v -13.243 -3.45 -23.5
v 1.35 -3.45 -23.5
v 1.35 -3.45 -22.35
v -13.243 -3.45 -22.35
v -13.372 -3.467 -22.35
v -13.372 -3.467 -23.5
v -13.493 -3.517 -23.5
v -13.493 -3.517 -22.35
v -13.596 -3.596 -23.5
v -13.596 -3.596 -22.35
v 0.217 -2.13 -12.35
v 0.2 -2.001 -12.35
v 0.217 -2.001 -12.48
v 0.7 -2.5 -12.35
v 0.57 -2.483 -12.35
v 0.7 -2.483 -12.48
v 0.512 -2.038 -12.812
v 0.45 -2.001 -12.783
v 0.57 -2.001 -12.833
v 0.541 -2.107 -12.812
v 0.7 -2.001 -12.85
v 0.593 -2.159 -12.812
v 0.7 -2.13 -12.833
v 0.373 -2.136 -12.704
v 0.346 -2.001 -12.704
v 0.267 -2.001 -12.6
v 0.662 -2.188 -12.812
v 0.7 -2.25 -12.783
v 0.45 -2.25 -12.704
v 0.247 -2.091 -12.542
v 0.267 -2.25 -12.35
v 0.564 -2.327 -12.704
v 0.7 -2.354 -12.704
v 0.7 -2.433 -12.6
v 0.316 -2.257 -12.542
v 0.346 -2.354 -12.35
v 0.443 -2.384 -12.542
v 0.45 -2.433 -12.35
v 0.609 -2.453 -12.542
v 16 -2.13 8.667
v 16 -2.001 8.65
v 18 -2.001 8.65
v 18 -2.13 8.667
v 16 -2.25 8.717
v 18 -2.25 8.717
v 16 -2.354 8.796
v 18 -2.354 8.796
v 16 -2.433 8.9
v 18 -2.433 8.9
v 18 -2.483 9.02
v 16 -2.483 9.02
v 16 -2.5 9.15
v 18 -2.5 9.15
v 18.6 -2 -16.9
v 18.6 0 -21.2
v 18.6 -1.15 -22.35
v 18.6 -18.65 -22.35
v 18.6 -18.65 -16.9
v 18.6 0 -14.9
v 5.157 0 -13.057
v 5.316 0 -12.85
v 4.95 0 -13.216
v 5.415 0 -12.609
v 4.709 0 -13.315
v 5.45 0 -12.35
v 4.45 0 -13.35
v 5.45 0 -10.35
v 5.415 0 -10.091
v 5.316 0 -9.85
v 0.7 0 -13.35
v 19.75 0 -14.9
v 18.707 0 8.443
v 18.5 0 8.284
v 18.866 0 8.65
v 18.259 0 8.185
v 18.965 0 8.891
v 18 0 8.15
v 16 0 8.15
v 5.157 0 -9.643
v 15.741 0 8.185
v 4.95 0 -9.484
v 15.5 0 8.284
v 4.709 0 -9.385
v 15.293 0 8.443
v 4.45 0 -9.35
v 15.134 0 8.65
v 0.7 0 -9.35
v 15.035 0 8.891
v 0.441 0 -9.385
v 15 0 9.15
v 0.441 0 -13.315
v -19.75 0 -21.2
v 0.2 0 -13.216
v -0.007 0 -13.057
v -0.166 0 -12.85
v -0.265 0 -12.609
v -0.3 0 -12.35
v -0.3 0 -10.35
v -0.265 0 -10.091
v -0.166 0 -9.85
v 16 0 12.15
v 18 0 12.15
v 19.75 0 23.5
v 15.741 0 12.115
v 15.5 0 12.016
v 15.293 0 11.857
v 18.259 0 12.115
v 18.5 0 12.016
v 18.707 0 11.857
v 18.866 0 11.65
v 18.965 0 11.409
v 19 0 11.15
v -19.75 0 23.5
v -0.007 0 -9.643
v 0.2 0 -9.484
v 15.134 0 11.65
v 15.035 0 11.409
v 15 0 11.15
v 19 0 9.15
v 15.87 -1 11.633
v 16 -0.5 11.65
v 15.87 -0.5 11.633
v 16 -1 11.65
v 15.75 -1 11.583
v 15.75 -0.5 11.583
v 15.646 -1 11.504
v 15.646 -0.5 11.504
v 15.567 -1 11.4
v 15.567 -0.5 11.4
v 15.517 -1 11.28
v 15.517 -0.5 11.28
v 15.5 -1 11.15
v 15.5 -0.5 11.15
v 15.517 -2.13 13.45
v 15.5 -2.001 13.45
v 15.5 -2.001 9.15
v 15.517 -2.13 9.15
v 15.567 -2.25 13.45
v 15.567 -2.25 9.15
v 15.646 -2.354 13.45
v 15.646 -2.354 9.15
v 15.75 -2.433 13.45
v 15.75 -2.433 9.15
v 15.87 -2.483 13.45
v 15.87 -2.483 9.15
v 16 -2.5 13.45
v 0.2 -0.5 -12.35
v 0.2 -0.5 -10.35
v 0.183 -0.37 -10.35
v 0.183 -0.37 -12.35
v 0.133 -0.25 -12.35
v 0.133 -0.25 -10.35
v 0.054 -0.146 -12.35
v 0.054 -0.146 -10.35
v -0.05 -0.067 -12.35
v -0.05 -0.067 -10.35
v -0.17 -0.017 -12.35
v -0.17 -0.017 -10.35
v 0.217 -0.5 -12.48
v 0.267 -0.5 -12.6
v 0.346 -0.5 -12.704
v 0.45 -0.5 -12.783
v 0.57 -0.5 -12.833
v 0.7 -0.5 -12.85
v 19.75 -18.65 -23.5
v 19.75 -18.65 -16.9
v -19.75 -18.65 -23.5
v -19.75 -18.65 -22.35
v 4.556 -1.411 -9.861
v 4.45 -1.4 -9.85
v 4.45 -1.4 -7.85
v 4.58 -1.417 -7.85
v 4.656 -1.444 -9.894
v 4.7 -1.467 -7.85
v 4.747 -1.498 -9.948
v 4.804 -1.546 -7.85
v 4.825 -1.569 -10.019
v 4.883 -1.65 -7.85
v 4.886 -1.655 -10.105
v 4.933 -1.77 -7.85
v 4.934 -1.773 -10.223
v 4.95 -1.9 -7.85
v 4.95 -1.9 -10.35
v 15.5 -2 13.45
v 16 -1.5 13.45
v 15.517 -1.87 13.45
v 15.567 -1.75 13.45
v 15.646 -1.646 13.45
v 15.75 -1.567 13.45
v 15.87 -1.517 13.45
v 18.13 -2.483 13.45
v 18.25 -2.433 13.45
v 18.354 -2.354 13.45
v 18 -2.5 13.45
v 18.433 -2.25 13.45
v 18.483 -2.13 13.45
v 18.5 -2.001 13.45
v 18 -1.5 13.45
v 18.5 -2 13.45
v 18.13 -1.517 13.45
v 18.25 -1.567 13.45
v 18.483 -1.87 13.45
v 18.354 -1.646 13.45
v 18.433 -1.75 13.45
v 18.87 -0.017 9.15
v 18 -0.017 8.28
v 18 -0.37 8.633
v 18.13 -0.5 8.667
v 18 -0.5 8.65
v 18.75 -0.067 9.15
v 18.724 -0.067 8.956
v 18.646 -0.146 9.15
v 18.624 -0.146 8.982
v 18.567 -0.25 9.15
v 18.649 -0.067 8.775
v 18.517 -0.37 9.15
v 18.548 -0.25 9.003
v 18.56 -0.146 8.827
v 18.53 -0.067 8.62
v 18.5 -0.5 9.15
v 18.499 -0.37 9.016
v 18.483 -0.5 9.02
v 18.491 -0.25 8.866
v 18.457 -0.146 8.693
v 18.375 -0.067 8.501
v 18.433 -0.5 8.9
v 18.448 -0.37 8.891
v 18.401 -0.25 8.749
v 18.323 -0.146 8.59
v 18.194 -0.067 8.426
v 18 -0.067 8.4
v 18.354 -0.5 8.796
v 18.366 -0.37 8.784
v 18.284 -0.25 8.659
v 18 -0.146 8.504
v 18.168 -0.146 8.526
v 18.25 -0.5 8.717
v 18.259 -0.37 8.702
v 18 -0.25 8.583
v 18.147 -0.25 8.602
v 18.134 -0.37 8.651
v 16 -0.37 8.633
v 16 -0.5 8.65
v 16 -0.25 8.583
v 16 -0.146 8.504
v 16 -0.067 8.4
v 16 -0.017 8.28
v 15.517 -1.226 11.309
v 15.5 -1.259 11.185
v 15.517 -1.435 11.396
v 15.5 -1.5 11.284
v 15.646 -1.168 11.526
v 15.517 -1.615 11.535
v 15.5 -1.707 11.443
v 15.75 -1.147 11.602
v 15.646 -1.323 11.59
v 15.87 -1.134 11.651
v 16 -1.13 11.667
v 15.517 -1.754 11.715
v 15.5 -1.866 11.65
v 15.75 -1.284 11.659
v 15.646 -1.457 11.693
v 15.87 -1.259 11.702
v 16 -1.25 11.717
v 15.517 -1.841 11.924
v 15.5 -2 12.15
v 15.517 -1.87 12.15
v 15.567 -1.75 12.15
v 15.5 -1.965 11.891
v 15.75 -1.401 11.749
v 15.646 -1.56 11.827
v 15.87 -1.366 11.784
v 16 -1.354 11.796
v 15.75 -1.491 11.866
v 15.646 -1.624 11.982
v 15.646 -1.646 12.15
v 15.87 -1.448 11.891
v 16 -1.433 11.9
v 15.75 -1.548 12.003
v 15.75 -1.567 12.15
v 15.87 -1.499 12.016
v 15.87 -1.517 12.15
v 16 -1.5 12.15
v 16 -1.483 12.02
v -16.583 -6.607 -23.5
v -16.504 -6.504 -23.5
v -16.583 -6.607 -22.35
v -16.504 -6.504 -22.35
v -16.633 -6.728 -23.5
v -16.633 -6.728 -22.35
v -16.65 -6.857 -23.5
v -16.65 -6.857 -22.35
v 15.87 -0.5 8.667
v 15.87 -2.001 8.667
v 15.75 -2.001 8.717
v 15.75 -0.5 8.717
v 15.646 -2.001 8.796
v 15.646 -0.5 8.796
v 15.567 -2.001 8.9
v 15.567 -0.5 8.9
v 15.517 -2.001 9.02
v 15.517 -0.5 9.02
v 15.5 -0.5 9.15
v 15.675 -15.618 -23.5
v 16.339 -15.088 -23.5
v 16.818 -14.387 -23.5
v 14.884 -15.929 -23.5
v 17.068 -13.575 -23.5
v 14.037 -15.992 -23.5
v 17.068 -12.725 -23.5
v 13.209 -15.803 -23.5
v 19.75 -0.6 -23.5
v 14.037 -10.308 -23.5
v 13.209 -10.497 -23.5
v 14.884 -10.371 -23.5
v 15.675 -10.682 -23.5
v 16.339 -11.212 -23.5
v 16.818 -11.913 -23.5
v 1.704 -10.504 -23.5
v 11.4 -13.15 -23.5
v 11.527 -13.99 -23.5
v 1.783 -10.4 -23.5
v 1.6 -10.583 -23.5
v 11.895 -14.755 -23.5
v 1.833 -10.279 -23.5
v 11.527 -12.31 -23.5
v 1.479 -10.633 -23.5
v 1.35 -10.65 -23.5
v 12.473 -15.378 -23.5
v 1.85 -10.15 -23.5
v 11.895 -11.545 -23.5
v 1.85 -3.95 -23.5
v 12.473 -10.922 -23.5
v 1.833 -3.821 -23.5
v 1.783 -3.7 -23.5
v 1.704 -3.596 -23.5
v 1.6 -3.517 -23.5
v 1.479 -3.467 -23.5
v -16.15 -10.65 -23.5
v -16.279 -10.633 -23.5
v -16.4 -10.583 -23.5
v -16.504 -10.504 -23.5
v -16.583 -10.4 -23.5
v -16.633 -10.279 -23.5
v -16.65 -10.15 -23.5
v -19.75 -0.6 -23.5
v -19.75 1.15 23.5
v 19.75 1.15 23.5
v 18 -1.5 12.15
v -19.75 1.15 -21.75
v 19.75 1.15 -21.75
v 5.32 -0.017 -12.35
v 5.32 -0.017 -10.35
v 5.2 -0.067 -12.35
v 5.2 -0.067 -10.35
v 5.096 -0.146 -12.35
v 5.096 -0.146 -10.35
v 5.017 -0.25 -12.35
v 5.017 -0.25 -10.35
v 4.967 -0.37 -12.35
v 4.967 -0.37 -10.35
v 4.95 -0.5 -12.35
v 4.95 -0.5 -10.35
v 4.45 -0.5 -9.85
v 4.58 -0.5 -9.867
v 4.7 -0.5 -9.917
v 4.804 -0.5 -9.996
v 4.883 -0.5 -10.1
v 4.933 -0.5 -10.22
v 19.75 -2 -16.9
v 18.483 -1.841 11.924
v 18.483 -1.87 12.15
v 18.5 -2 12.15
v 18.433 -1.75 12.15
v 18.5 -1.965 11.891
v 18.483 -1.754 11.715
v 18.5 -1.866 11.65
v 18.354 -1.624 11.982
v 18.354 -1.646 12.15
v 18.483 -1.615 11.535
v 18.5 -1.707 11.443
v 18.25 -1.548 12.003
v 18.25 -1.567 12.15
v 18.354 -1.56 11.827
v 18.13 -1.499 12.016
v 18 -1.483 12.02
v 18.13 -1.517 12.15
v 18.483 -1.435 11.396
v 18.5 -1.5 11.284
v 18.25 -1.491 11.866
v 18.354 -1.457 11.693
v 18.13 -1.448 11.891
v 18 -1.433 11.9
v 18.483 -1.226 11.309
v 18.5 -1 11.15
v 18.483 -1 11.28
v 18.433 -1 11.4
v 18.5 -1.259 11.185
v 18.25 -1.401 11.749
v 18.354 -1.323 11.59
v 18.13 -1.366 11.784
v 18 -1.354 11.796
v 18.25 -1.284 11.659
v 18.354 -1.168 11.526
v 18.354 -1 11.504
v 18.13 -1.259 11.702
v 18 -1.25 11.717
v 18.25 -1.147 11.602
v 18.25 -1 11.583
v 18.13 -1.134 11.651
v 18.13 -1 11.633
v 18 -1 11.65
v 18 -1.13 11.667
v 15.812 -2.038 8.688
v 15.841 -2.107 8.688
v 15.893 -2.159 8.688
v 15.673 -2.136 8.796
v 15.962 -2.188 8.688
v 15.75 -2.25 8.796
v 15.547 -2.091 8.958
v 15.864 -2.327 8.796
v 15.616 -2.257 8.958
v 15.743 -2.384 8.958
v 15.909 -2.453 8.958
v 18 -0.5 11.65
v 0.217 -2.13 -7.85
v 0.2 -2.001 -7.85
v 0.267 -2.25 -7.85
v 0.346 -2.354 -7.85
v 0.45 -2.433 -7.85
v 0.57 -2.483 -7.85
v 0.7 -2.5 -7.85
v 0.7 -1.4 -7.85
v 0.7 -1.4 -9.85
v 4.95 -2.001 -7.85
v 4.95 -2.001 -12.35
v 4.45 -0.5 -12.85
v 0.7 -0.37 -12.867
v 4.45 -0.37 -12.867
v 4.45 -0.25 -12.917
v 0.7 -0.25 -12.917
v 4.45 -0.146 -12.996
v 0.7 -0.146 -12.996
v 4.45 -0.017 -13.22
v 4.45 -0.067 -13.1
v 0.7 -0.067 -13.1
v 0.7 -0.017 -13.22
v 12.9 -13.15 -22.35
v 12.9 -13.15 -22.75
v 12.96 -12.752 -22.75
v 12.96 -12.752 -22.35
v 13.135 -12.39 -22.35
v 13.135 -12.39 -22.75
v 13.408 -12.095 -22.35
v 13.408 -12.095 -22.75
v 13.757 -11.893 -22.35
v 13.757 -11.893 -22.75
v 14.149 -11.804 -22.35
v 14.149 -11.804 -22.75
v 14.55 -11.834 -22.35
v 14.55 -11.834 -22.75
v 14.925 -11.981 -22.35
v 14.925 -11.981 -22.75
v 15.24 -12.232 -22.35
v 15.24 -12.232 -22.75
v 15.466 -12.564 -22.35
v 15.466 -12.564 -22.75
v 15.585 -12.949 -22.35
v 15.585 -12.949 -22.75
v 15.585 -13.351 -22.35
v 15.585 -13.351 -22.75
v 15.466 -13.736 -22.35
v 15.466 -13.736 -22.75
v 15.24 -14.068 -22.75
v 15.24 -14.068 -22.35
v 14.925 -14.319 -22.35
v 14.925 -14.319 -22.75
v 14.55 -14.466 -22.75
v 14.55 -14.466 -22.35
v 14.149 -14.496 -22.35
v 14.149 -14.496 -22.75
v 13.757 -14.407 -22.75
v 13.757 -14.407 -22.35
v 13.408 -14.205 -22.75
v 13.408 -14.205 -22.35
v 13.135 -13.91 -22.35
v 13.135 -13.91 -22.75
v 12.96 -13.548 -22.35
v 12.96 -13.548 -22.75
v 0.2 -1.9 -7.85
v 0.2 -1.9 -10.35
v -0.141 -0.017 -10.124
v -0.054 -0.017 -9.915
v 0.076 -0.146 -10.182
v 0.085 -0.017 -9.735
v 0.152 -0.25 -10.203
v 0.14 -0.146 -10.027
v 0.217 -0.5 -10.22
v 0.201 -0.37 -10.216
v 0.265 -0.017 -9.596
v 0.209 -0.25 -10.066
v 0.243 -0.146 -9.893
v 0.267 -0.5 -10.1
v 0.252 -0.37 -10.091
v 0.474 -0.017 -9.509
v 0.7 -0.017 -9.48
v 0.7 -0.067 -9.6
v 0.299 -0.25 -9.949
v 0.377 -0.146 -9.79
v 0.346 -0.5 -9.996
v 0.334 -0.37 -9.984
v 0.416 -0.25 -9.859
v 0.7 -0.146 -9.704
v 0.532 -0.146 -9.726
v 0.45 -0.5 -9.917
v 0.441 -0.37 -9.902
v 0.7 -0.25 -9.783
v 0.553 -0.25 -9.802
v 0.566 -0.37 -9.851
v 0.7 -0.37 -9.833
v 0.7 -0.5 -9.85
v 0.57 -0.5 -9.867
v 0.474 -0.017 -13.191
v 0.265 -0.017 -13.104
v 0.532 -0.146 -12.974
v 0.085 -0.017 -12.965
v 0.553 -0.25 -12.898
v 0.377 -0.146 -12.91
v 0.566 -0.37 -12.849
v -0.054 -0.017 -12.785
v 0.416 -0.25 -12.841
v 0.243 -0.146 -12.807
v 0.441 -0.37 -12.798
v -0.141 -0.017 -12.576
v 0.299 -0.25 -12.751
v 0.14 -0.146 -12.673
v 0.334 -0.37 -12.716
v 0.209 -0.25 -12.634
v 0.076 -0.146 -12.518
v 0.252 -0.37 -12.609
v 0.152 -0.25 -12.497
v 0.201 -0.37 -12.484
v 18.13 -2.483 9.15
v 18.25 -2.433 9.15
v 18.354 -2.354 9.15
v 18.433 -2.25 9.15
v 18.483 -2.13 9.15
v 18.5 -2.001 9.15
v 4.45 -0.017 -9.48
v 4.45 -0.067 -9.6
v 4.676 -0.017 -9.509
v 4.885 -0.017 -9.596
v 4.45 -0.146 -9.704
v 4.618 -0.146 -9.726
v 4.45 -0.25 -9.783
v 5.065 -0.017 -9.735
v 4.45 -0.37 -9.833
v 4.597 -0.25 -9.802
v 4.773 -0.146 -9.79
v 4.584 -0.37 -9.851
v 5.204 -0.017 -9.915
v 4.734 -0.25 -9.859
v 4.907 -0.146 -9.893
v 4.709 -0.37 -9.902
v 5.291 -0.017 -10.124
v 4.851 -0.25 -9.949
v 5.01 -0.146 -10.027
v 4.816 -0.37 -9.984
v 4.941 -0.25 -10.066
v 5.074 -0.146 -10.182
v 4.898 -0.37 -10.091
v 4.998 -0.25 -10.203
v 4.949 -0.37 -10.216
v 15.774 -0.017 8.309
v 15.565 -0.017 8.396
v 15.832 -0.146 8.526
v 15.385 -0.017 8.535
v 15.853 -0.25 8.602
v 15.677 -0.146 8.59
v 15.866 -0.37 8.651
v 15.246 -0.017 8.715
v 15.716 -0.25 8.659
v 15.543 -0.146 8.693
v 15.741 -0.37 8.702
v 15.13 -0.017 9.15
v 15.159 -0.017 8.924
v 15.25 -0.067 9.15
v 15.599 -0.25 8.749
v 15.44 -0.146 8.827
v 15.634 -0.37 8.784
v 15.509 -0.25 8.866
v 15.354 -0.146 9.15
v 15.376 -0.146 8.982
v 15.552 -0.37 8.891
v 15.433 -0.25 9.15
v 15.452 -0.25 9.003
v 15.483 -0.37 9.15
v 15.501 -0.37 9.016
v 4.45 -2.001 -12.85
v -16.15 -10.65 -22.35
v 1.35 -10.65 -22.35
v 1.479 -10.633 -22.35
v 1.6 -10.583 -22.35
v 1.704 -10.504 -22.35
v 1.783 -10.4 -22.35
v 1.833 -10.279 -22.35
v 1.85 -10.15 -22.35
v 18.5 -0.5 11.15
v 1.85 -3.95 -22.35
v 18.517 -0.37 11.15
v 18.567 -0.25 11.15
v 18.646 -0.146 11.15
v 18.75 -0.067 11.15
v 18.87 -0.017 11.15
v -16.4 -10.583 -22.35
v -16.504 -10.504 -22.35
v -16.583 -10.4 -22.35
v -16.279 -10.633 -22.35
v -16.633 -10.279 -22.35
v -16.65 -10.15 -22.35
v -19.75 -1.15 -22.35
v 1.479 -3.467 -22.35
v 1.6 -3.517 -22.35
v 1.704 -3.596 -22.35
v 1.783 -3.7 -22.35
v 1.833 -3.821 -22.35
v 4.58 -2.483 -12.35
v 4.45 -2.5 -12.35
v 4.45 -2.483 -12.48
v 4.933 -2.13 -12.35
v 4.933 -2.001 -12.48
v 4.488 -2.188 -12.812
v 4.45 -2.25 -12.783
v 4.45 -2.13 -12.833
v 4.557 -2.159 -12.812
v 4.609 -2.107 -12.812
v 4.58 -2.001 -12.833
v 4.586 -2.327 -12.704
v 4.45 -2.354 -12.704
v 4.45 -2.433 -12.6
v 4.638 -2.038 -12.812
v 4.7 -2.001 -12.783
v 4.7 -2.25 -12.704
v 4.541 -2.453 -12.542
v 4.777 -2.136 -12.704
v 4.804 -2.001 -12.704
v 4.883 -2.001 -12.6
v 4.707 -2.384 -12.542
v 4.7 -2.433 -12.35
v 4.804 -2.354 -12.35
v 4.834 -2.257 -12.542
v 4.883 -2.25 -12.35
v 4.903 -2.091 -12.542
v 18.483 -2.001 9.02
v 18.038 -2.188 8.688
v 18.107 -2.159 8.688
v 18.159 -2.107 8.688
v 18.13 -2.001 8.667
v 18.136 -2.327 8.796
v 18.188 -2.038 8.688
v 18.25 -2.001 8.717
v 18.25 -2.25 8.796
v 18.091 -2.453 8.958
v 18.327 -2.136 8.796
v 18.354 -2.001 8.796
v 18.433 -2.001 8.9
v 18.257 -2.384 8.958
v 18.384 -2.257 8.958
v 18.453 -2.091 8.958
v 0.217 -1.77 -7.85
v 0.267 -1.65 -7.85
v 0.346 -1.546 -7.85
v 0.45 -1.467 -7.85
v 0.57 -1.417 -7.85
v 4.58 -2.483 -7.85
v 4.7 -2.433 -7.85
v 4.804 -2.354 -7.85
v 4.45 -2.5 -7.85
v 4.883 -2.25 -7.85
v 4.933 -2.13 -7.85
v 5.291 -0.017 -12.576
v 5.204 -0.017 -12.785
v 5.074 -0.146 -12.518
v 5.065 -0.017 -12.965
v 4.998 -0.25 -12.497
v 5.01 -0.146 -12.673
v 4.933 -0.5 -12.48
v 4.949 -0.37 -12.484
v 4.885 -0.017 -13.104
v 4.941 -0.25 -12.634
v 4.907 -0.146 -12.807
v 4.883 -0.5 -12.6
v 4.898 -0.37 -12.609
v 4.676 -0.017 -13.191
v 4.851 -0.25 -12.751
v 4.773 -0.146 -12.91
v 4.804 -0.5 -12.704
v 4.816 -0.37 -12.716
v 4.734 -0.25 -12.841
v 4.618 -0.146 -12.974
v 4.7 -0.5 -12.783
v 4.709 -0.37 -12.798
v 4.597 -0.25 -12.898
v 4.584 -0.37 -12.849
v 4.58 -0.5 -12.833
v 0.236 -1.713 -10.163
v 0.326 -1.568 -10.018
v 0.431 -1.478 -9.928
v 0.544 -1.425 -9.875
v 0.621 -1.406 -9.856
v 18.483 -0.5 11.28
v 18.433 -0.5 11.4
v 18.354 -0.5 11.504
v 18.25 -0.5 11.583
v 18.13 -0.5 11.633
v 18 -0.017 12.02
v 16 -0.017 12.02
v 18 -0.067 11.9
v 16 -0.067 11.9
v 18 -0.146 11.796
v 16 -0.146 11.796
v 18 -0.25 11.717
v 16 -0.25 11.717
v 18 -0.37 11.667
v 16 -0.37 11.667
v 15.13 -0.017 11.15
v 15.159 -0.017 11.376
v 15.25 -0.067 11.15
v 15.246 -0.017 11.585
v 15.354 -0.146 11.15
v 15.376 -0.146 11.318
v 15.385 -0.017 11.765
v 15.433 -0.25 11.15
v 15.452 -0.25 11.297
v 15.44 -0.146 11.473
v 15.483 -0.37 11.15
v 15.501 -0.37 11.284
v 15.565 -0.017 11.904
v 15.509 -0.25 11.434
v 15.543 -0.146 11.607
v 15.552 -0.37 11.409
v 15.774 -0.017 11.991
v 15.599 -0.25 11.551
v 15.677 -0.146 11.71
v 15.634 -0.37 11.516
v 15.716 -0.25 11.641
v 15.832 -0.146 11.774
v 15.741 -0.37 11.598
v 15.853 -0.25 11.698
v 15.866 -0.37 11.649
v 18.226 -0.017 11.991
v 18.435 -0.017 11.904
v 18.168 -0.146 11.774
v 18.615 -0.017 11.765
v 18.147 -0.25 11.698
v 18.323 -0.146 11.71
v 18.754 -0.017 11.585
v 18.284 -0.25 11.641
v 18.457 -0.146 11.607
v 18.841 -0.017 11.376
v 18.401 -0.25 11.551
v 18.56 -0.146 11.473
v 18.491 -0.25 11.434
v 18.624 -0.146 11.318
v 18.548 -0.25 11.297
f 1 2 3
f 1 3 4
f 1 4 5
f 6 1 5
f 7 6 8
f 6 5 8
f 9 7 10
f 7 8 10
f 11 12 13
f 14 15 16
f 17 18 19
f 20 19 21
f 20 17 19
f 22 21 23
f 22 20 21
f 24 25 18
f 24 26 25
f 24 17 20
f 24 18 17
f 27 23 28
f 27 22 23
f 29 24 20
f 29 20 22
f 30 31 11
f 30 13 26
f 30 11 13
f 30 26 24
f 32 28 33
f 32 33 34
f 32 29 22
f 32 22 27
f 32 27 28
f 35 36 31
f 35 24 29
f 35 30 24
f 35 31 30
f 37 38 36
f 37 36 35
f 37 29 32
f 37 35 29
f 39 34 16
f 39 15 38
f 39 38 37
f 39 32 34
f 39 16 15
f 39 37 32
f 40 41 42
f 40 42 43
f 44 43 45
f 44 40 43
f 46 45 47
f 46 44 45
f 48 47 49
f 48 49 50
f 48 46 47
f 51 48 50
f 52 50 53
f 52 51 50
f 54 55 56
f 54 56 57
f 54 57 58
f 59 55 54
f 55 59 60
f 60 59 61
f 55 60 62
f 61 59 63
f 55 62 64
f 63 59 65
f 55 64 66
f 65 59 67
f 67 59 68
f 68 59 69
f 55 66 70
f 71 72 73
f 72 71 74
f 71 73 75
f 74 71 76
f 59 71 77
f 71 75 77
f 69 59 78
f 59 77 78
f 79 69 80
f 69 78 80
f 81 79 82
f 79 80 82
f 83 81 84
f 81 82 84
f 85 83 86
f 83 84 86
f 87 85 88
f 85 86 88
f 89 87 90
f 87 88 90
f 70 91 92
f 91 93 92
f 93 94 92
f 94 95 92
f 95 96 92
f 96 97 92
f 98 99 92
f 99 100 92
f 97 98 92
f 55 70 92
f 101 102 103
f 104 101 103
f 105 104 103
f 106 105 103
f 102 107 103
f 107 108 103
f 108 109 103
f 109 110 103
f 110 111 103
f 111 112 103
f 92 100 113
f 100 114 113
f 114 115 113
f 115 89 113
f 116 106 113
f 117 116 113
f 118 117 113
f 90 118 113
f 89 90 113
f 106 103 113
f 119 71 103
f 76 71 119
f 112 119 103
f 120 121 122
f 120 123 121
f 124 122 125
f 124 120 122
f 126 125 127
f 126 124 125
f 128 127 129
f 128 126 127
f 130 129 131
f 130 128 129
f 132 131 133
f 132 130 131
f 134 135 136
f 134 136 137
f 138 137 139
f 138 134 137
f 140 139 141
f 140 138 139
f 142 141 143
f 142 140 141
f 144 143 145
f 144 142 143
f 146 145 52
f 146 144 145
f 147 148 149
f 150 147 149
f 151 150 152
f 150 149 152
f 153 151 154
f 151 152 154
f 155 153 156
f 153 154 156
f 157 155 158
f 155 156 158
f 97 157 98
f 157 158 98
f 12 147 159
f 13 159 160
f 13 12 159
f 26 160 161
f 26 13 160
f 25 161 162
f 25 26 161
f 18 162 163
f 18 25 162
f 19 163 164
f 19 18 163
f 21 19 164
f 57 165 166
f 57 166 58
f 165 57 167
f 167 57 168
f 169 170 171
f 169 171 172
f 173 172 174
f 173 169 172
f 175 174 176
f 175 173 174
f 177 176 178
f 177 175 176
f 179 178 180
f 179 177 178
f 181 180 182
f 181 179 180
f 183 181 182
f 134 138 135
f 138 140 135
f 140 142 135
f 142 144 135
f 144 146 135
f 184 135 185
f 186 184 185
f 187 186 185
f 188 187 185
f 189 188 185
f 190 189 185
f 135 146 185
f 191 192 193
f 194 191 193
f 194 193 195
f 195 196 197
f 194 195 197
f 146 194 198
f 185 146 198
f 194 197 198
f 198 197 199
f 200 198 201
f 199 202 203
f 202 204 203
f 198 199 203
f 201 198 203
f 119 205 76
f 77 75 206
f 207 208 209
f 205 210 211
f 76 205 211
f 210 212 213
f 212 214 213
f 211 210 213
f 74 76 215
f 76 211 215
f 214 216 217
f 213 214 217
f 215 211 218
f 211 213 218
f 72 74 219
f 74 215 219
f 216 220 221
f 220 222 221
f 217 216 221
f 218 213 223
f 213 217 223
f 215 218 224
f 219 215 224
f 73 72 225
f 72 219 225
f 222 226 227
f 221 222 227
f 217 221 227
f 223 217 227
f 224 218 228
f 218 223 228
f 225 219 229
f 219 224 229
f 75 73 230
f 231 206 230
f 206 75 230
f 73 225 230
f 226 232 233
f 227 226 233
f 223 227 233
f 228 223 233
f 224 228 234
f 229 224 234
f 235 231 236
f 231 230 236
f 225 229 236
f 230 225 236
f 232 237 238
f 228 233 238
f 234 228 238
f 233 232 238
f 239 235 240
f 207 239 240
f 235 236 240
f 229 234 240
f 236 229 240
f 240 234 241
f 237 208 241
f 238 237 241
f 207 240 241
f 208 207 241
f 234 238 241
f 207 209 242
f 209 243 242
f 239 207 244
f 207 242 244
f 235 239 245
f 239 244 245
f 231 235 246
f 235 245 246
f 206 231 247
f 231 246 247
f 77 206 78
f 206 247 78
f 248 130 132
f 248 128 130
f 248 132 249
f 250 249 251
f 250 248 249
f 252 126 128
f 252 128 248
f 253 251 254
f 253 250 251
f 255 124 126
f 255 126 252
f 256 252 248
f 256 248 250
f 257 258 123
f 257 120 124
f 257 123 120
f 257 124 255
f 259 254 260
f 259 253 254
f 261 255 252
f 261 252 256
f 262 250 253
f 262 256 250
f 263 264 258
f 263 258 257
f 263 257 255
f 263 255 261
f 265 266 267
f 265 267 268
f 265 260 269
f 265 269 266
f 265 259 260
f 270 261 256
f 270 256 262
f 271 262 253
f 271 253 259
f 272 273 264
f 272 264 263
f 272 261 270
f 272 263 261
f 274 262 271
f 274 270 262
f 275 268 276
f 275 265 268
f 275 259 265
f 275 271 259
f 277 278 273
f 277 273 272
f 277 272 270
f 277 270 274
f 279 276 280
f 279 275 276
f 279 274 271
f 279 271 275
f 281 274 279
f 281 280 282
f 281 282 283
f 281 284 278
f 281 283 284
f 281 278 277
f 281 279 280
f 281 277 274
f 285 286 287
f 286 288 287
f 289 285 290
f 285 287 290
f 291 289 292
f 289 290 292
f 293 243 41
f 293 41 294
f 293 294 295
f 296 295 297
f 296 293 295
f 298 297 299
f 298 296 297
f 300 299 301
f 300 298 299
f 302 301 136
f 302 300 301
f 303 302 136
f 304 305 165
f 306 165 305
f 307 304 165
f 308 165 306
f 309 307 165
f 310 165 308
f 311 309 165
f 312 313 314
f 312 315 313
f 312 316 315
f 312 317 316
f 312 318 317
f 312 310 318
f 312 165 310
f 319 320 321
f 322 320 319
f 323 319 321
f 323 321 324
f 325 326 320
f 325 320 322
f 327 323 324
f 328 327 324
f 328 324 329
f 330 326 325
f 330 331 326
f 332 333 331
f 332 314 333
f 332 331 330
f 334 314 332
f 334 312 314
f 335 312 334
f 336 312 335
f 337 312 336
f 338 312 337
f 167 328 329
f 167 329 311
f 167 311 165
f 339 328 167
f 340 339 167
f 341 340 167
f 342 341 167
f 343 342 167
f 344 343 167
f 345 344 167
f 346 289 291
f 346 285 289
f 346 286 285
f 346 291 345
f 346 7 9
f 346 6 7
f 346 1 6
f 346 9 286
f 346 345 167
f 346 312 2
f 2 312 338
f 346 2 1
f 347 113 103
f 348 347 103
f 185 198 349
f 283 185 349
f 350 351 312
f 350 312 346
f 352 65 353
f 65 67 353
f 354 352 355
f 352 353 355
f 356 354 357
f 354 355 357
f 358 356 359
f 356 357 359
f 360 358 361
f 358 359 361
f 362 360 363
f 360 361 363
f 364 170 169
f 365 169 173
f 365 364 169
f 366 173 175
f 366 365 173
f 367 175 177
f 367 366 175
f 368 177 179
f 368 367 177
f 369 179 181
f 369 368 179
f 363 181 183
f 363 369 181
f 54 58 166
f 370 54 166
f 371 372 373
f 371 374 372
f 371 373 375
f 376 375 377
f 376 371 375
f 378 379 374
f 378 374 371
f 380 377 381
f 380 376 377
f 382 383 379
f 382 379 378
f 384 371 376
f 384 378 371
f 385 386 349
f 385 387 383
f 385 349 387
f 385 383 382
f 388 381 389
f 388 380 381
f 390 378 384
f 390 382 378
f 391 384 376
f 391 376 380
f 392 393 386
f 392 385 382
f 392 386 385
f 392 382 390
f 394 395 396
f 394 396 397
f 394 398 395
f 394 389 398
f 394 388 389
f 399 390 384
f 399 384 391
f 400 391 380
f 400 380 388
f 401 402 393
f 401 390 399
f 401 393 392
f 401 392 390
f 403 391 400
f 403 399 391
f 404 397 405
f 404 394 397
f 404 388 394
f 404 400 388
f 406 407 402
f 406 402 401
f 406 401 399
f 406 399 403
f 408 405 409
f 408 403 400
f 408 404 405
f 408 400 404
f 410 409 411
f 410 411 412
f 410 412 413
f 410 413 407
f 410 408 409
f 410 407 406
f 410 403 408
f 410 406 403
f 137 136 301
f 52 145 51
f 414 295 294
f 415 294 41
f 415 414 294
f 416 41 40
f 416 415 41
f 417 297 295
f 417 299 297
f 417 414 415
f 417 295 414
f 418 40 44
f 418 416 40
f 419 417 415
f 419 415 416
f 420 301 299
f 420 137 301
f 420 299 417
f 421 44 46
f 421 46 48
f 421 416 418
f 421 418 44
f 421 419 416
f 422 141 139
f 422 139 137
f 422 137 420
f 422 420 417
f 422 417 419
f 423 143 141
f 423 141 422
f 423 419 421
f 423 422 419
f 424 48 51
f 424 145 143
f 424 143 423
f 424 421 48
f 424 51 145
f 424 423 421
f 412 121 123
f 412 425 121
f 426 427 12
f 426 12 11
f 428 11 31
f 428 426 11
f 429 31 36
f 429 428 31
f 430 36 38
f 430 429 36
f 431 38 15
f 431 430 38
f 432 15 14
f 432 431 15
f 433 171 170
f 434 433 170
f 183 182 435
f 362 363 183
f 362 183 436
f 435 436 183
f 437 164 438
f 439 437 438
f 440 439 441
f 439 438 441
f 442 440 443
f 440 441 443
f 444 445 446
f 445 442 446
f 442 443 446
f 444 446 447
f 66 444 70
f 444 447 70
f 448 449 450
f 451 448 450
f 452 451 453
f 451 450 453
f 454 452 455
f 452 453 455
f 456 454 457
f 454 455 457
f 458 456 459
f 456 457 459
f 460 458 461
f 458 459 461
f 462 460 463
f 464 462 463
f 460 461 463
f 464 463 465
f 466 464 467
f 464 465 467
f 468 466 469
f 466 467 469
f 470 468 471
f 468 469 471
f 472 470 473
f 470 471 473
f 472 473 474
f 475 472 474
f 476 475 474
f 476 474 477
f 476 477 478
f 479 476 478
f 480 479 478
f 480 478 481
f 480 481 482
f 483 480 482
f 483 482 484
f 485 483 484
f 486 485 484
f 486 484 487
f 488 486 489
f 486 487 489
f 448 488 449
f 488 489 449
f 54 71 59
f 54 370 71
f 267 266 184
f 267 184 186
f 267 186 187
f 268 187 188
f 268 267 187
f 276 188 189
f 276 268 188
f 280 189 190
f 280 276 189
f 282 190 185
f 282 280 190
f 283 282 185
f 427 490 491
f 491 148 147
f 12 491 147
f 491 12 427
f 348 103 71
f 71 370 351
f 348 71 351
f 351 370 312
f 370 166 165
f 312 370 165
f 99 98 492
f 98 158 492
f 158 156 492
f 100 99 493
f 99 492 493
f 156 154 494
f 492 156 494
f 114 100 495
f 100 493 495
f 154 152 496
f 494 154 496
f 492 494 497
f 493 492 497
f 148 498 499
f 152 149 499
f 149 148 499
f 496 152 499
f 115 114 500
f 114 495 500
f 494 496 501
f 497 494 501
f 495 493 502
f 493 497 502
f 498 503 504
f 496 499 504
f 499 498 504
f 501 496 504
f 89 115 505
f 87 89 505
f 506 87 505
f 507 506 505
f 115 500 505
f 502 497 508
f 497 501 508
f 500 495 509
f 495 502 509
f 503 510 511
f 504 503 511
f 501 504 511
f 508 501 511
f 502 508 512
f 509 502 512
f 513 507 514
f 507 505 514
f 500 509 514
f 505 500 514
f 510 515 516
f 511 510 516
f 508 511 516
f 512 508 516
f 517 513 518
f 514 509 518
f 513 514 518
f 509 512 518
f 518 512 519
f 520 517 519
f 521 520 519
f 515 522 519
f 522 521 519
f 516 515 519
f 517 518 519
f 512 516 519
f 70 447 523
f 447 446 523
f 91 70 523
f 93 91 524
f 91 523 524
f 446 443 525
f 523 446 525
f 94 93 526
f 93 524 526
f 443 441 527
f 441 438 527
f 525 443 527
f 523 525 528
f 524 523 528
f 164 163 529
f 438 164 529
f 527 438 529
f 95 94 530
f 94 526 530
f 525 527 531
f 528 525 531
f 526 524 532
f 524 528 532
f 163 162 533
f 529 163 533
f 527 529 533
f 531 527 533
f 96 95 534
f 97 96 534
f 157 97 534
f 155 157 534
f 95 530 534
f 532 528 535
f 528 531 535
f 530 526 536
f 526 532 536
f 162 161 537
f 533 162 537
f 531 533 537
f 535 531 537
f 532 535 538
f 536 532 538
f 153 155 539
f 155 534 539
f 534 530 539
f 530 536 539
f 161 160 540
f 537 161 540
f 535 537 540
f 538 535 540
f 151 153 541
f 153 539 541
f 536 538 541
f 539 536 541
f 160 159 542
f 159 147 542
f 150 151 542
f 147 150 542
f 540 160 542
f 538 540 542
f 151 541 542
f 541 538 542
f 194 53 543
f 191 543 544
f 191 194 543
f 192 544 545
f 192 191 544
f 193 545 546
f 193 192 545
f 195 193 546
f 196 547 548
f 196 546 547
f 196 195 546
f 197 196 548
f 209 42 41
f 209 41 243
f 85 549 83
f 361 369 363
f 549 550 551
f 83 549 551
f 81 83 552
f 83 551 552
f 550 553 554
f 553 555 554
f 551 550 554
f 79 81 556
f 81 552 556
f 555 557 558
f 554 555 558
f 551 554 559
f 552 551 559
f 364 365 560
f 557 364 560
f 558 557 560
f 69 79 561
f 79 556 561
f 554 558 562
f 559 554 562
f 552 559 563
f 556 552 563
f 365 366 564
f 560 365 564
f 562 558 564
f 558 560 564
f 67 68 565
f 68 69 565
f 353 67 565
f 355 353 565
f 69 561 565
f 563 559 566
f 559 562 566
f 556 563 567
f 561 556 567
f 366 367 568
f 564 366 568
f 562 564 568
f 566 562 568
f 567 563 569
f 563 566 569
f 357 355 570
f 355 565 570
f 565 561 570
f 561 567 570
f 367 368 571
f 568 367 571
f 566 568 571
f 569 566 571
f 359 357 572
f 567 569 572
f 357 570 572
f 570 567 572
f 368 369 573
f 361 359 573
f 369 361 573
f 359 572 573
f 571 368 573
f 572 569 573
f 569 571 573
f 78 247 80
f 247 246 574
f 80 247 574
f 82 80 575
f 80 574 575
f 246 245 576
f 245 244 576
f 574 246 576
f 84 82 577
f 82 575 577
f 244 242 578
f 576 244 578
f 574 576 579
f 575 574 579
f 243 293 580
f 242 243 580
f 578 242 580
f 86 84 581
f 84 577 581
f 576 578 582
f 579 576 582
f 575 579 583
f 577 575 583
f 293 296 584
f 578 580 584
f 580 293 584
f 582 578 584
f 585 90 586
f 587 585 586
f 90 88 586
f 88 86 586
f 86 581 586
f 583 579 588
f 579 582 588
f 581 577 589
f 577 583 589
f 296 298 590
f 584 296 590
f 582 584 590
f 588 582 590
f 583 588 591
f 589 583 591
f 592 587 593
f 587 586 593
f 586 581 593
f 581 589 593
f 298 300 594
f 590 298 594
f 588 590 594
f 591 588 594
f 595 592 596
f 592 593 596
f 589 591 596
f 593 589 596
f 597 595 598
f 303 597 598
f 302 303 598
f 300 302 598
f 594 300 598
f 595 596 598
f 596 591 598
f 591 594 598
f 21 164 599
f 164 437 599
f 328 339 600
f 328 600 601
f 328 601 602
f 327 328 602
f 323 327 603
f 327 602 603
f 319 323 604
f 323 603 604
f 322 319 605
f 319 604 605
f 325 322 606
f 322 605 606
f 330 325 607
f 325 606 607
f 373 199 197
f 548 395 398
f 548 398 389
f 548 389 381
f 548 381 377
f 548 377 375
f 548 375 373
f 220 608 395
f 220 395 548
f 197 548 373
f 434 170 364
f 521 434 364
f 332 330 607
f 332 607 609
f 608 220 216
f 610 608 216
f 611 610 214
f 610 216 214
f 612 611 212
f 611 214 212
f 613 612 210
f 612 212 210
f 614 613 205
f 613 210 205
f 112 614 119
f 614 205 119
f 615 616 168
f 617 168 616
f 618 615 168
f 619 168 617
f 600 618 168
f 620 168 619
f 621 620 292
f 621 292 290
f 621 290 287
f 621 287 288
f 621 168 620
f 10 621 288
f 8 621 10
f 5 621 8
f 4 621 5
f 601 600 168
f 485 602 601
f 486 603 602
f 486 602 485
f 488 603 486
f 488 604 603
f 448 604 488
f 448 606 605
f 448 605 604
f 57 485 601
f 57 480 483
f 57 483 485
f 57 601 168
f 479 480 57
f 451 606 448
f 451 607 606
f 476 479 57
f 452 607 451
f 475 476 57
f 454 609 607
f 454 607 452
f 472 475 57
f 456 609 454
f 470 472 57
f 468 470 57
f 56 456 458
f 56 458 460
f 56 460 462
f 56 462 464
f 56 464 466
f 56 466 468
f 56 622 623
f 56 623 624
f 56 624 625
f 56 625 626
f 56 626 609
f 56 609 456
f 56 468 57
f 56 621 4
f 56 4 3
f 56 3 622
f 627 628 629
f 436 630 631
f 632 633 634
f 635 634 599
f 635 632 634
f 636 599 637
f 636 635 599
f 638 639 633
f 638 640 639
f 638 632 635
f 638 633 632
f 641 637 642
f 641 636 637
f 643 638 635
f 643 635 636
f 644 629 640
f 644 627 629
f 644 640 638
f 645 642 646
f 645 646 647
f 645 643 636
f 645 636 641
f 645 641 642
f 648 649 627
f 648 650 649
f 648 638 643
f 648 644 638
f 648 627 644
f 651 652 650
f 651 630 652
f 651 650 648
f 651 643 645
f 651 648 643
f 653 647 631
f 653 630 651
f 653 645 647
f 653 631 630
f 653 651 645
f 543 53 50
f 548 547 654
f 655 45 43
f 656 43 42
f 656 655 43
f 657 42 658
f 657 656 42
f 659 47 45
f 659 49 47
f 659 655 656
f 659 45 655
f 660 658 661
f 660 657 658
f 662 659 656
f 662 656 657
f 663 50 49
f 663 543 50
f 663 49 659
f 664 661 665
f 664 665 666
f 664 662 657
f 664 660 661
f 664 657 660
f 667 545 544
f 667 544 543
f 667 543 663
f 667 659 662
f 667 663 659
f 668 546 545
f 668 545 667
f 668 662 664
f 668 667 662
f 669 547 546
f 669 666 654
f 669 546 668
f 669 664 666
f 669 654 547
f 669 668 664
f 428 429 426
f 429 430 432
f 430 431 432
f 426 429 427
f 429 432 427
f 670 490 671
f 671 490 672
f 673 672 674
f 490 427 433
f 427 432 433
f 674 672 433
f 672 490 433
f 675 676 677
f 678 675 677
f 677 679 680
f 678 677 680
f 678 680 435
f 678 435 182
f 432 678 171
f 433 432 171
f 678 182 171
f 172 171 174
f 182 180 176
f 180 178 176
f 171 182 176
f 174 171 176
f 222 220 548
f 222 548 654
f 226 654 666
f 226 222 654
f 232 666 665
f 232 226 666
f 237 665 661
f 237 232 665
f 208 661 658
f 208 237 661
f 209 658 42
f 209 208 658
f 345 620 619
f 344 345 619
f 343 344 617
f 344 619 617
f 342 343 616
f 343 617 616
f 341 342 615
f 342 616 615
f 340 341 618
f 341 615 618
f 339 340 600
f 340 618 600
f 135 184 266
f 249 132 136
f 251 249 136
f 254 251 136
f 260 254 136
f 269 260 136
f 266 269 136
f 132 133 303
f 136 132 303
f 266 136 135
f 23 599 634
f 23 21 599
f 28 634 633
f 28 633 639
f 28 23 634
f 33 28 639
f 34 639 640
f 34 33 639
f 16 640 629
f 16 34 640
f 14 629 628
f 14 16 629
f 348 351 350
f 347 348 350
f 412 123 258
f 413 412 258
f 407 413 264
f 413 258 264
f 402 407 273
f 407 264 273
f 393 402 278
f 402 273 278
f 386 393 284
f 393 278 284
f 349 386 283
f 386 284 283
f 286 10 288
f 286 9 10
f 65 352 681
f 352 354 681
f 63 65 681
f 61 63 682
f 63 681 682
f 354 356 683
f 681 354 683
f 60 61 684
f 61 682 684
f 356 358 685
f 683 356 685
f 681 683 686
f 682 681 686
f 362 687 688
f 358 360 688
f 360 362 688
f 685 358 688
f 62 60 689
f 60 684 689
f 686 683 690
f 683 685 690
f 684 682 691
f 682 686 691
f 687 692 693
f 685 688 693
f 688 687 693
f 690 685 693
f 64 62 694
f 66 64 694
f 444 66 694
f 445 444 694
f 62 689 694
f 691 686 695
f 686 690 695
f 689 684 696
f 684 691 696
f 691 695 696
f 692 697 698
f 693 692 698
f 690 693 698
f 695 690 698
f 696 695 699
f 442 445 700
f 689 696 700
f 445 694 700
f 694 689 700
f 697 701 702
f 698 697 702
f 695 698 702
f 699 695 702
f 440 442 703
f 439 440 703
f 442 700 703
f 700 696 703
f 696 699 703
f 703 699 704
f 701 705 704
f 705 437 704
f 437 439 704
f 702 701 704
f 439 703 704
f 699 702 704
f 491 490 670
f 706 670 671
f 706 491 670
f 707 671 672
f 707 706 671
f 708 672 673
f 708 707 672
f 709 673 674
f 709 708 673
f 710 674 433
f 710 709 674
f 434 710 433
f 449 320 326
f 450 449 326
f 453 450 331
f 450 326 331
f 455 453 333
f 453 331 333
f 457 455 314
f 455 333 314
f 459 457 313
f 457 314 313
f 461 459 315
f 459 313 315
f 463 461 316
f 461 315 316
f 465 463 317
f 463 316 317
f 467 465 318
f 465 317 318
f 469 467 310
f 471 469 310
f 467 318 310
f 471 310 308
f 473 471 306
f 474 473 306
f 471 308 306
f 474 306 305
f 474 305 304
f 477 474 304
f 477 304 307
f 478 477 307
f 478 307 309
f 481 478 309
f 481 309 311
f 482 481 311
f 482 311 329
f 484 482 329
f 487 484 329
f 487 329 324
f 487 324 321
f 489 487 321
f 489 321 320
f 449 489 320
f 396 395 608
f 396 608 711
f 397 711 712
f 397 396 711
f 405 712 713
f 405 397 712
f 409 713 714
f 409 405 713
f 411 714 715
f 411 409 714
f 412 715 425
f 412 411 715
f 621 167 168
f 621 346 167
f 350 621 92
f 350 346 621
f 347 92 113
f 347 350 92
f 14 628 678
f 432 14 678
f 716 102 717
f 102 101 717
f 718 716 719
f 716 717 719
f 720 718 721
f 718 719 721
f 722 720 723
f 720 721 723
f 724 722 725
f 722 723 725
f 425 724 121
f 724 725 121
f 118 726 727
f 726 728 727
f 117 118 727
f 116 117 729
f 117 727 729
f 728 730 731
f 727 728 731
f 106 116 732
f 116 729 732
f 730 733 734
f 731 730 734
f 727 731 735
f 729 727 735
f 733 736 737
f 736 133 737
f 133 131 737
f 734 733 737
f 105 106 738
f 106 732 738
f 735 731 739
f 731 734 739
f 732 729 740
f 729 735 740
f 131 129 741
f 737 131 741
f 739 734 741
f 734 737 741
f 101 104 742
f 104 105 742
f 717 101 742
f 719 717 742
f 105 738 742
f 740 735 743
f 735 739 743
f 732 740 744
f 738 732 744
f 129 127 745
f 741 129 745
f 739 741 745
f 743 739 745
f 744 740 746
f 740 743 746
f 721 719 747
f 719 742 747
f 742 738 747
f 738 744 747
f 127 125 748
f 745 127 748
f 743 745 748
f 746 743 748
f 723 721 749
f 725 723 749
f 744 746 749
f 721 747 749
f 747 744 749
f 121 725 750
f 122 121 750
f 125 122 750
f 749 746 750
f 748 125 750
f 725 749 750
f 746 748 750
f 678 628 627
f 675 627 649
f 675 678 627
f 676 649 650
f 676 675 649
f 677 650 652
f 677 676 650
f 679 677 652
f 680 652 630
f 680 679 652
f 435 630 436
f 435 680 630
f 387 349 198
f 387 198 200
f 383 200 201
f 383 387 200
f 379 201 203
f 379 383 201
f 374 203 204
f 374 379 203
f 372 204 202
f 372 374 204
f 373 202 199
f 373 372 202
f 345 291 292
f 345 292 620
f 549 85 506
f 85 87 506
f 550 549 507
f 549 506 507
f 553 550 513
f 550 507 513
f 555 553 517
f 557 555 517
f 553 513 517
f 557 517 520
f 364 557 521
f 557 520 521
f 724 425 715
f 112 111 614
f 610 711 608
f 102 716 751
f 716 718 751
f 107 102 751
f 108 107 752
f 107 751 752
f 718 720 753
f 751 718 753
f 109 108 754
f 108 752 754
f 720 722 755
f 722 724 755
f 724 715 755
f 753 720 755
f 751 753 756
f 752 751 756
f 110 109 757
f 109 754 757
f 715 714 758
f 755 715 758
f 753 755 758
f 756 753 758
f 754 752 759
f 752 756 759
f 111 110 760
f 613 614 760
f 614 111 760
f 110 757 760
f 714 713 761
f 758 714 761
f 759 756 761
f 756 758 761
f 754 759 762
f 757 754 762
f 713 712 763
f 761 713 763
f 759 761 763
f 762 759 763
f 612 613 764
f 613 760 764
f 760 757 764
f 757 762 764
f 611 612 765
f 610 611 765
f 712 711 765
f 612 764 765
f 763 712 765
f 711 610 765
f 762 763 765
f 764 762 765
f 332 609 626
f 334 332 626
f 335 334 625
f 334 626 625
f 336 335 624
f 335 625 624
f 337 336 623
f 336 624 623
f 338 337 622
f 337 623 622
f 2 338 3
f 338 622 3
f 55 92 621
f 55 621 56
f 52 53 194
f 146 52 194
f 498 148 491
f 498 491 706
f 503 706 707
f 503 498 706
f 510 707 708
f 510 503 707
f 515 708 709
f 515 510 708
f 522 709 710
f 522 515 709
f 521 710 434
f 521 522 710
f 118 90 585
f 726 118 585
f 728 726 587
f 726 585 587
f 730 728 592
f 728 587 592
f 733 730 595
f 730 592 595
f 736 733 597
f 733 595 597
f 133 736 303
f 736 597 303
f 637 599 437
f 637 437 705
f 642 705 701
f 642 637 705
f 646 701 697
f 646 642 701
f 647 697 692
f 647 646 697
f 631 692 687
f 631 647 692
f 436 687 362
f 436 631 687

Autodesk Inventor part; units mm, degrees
ref_plane "YZ Plane" through (0, 0, 0) normal (1, 0, 0) x (0, 1, 0)
sketch "Sketch1" plane through (0, 0, 0) normal (0, 1, 0) x (-1, 0, 0)
  line L0 (19.75, 23.5) -> (-19.75, 23.5)
  line L1 (-19.75, 23.5) -> (-19.75, -23.5)
  line L2 (-19.75, -23.5) -> (19.75, -23.5)
  line L3 (19.75, -23.5) -> (19.75, 23.5)
  line L4 (0, -28.9451) -> (0, 30.9067)
  line L5 (30.9717, 0) -> (-30.2589, 0)
  point P0 (0, 0)
  dimension "d0" = 39.5
  dimension "d1" = 47
extrude "Extrusion1" add sketch "Sketch1" along normal blind 1.15
sketch "Sketch2" plane through (0, 0, 0) normal (0, 1, 0) x (-1, 0, 0)
  line L0 (-18.6, -22.35) -> (-18.6, -16.9)
  line L1 (-18.6, -16.9) -> (-19.75, -16.9)
  line L2 (-19.75, -16.9) -> (-19.75, -23.5)
  line L3 (-19.75, -23.5) -> (19.75, -23.5)
  line L4 (19.75, -23.5) -> (19.75, -22.35)
  line L5 (19.75, -22.35) -> (-18.6, -22.35)
  line L6 (19.75, -23.5) -> (19.75, 23.5) projected
  point P0 (0, 0)
  point P1 (19.75, -22.925)
  dimension "d7" = 6.6
  dimension "d9" = 1.15
extrude "Extrusion2" add sketch "Sketch2" against normal blind 18.65
chamfer "Chamfer1" distance 1.15 angle 45 1 edges at (-0.575, 0, -22.35) measured on face at (5.8167, -12.4333, -22.35)
chamfer "Chamfer3" distance 1.75 angle 45 1 edges at (0, 1.15, -23.5)
sketch "Sketch3" plane through (19.75, -18.65, -23.5) normal (0, 0, -1) x (-1, 0, 0)
  line L0 (36.4, 8) -> (17.9, 8)
  line L1 (17.9, 8) -> (17.9, 15.2)
  line L2 (17.9, 15.2) -> (33.2, 15.2)
  line L3 (36.4, 12) -> (36.4, 8)
  circle A0 centre (5.5, 5.5) radius 1.35
  line L4 (33.2, 15.2) -> (36.4, 12)
  line L5 (0, 0) -> (0, 18.05) projected
  line L6 (39.5, 0) -> (0, 0) projected
  line L7 (39.5, 0) -> (39.5, 18.05) projected
  point P0 (19.75, 18.65)
  dimension "d19" = 2.7
  dimension "d21" = 135
  dimension "d22" = 135
  dimension "d24" = 18.5
  dimension "d25" = 7.2
  dimension "d34" = 5.5
  dimension "d35" = 5.5
  dimension "d36" = 8
  dimension "d43" = 3.1
  dimension "d47" = 4
extrude "Extrusion3" cut sketch "Sketch3" against normal blind 1.15
chamfer "Chamfer4" distance 2 angle 45 1 edges at (19.175, 0, -16.9)
chamfer "Chamfer5" distance 1.5 distance2 0.75 1 edges at (15.6, -13.15, -23.5) measured on face at (11.7904, -5.3126, -23.5)
fillet "Fillet1" radius 0.5 5 edges at (-16.65, -10.65, -22.925) (-16.65, -6.65, -22.925) (-13.45, -3.45, -22.925) (1.85, -10.65, -22.925) (1.85, -3.45, -22.925)
ref_plane "Work Plane1" through (18.5, -18.65, -16.9) normal (1, 0, 0) x (0, 0, -1)
sketch "Sketch5" plane through (18.5, -18.65, -16.9) normal (1, 0, 0) x (0, 0, -1)
  line L0 (-40.4, 18.65) -> (-2, 18.65) projected
  line L1 (-25.55, 18.65) -> (-28.55, 18.65)
  line L2 (-28.55, 18.65) -> (-28.55, 17.15)
  line L3 (-25.55, 16.15) -> (-25.55, 18.65)
  line L4 (-25.55, 16.15) -> (-30.35, 16.15)
  line L5 (-30.35, 16.15) -> (-30.35, 17.15)
  line L6 (-30.35, 17.15) -> (-28.55, 17.15)
  line L7 (5.45, 17.5) -> (5.45, 0) projected
  point P0 (-16.9, 18.65)
  dimension "d52" = 4.8
  dimension "d55" = 1.5
  dimension "d57" = 31
  dimension "d58" = 3
  dimension "d70" = 2.5
extrude "Extrusion4" add sketch "Sketch5" against normal blind 3
ref_plane "Work Plane2" through (4.95, -18.65, -16.9) normal (1, 0, 0) x (0, 0, -1)
sketch "Sketch6" plane through (4.95, -18.65, -16.9) normal (1, 0, 0) x (0, 0, -1)
  line L0 (4.3, 18.65) -> (-40.4, 18.65) projected
  line L1 (-4.05, 18.65) -> (-4.05, 16.15)
  line L2 (-4.05, 16.15) -> (-9.05, 16.15)
  line L3 (-9.05, 16.15) -> (-9.05, 17.25)
  line L4 (-9.05, 17.25) -> (-7.05, 17.25)
  line L5 (-7.05, 17.25) -> (-7.05, 18.65)
  line L6 (5.45, 17.5) -> (5.45, 0) projected
  point P0 (-16.9, 18.65)
  dimension "d62" = 5
  dimension "d63" = 2
  dimension "d64" = 2.5
  dimension "d68" = 9.5
  dimension "d69" = 1.4
extrude "Extrusion5" add sketch "Sketch6" against normal blind 4.75
fillet "Fillet4" radius 0.5 27 edges at (18.5, -2.5, 11.05) (15.5, -2.5, 11.05) (18.5, -0.75, 11.65) (17, 0, 11.65) (18.5, 0, 10.15) (18.5, -1.25, 8.65) (17, 0, 8.65) (17, -2.5, 8.65) (15.5, -1.25, 8.65) (15.5, 0, 10.15) (15.5, -0.75, 11.65) (15.5, -1.5, 12.55) (18.5, -1.5, 12.55) (17, -1.5, 11.65) (4.95, -0.7, -9.85) (4.95, 0, -11.35) (2.575, 0, -9.85) (4.95, -1.4, -8.85) (0.2, -1.4, -8.85) (0.2, -0.7, -9.85) (0.2, 0, -11.35) (0.2, -2.5, -10.35) (4.95, -2.5, -10.35) (2.575, -2.5, -12.85) (0.2, -1.25, -12.85) (2.575, 0, -12.85) (4.95, -1.25, -12.85)
properties part number "laptop_port_cover"
